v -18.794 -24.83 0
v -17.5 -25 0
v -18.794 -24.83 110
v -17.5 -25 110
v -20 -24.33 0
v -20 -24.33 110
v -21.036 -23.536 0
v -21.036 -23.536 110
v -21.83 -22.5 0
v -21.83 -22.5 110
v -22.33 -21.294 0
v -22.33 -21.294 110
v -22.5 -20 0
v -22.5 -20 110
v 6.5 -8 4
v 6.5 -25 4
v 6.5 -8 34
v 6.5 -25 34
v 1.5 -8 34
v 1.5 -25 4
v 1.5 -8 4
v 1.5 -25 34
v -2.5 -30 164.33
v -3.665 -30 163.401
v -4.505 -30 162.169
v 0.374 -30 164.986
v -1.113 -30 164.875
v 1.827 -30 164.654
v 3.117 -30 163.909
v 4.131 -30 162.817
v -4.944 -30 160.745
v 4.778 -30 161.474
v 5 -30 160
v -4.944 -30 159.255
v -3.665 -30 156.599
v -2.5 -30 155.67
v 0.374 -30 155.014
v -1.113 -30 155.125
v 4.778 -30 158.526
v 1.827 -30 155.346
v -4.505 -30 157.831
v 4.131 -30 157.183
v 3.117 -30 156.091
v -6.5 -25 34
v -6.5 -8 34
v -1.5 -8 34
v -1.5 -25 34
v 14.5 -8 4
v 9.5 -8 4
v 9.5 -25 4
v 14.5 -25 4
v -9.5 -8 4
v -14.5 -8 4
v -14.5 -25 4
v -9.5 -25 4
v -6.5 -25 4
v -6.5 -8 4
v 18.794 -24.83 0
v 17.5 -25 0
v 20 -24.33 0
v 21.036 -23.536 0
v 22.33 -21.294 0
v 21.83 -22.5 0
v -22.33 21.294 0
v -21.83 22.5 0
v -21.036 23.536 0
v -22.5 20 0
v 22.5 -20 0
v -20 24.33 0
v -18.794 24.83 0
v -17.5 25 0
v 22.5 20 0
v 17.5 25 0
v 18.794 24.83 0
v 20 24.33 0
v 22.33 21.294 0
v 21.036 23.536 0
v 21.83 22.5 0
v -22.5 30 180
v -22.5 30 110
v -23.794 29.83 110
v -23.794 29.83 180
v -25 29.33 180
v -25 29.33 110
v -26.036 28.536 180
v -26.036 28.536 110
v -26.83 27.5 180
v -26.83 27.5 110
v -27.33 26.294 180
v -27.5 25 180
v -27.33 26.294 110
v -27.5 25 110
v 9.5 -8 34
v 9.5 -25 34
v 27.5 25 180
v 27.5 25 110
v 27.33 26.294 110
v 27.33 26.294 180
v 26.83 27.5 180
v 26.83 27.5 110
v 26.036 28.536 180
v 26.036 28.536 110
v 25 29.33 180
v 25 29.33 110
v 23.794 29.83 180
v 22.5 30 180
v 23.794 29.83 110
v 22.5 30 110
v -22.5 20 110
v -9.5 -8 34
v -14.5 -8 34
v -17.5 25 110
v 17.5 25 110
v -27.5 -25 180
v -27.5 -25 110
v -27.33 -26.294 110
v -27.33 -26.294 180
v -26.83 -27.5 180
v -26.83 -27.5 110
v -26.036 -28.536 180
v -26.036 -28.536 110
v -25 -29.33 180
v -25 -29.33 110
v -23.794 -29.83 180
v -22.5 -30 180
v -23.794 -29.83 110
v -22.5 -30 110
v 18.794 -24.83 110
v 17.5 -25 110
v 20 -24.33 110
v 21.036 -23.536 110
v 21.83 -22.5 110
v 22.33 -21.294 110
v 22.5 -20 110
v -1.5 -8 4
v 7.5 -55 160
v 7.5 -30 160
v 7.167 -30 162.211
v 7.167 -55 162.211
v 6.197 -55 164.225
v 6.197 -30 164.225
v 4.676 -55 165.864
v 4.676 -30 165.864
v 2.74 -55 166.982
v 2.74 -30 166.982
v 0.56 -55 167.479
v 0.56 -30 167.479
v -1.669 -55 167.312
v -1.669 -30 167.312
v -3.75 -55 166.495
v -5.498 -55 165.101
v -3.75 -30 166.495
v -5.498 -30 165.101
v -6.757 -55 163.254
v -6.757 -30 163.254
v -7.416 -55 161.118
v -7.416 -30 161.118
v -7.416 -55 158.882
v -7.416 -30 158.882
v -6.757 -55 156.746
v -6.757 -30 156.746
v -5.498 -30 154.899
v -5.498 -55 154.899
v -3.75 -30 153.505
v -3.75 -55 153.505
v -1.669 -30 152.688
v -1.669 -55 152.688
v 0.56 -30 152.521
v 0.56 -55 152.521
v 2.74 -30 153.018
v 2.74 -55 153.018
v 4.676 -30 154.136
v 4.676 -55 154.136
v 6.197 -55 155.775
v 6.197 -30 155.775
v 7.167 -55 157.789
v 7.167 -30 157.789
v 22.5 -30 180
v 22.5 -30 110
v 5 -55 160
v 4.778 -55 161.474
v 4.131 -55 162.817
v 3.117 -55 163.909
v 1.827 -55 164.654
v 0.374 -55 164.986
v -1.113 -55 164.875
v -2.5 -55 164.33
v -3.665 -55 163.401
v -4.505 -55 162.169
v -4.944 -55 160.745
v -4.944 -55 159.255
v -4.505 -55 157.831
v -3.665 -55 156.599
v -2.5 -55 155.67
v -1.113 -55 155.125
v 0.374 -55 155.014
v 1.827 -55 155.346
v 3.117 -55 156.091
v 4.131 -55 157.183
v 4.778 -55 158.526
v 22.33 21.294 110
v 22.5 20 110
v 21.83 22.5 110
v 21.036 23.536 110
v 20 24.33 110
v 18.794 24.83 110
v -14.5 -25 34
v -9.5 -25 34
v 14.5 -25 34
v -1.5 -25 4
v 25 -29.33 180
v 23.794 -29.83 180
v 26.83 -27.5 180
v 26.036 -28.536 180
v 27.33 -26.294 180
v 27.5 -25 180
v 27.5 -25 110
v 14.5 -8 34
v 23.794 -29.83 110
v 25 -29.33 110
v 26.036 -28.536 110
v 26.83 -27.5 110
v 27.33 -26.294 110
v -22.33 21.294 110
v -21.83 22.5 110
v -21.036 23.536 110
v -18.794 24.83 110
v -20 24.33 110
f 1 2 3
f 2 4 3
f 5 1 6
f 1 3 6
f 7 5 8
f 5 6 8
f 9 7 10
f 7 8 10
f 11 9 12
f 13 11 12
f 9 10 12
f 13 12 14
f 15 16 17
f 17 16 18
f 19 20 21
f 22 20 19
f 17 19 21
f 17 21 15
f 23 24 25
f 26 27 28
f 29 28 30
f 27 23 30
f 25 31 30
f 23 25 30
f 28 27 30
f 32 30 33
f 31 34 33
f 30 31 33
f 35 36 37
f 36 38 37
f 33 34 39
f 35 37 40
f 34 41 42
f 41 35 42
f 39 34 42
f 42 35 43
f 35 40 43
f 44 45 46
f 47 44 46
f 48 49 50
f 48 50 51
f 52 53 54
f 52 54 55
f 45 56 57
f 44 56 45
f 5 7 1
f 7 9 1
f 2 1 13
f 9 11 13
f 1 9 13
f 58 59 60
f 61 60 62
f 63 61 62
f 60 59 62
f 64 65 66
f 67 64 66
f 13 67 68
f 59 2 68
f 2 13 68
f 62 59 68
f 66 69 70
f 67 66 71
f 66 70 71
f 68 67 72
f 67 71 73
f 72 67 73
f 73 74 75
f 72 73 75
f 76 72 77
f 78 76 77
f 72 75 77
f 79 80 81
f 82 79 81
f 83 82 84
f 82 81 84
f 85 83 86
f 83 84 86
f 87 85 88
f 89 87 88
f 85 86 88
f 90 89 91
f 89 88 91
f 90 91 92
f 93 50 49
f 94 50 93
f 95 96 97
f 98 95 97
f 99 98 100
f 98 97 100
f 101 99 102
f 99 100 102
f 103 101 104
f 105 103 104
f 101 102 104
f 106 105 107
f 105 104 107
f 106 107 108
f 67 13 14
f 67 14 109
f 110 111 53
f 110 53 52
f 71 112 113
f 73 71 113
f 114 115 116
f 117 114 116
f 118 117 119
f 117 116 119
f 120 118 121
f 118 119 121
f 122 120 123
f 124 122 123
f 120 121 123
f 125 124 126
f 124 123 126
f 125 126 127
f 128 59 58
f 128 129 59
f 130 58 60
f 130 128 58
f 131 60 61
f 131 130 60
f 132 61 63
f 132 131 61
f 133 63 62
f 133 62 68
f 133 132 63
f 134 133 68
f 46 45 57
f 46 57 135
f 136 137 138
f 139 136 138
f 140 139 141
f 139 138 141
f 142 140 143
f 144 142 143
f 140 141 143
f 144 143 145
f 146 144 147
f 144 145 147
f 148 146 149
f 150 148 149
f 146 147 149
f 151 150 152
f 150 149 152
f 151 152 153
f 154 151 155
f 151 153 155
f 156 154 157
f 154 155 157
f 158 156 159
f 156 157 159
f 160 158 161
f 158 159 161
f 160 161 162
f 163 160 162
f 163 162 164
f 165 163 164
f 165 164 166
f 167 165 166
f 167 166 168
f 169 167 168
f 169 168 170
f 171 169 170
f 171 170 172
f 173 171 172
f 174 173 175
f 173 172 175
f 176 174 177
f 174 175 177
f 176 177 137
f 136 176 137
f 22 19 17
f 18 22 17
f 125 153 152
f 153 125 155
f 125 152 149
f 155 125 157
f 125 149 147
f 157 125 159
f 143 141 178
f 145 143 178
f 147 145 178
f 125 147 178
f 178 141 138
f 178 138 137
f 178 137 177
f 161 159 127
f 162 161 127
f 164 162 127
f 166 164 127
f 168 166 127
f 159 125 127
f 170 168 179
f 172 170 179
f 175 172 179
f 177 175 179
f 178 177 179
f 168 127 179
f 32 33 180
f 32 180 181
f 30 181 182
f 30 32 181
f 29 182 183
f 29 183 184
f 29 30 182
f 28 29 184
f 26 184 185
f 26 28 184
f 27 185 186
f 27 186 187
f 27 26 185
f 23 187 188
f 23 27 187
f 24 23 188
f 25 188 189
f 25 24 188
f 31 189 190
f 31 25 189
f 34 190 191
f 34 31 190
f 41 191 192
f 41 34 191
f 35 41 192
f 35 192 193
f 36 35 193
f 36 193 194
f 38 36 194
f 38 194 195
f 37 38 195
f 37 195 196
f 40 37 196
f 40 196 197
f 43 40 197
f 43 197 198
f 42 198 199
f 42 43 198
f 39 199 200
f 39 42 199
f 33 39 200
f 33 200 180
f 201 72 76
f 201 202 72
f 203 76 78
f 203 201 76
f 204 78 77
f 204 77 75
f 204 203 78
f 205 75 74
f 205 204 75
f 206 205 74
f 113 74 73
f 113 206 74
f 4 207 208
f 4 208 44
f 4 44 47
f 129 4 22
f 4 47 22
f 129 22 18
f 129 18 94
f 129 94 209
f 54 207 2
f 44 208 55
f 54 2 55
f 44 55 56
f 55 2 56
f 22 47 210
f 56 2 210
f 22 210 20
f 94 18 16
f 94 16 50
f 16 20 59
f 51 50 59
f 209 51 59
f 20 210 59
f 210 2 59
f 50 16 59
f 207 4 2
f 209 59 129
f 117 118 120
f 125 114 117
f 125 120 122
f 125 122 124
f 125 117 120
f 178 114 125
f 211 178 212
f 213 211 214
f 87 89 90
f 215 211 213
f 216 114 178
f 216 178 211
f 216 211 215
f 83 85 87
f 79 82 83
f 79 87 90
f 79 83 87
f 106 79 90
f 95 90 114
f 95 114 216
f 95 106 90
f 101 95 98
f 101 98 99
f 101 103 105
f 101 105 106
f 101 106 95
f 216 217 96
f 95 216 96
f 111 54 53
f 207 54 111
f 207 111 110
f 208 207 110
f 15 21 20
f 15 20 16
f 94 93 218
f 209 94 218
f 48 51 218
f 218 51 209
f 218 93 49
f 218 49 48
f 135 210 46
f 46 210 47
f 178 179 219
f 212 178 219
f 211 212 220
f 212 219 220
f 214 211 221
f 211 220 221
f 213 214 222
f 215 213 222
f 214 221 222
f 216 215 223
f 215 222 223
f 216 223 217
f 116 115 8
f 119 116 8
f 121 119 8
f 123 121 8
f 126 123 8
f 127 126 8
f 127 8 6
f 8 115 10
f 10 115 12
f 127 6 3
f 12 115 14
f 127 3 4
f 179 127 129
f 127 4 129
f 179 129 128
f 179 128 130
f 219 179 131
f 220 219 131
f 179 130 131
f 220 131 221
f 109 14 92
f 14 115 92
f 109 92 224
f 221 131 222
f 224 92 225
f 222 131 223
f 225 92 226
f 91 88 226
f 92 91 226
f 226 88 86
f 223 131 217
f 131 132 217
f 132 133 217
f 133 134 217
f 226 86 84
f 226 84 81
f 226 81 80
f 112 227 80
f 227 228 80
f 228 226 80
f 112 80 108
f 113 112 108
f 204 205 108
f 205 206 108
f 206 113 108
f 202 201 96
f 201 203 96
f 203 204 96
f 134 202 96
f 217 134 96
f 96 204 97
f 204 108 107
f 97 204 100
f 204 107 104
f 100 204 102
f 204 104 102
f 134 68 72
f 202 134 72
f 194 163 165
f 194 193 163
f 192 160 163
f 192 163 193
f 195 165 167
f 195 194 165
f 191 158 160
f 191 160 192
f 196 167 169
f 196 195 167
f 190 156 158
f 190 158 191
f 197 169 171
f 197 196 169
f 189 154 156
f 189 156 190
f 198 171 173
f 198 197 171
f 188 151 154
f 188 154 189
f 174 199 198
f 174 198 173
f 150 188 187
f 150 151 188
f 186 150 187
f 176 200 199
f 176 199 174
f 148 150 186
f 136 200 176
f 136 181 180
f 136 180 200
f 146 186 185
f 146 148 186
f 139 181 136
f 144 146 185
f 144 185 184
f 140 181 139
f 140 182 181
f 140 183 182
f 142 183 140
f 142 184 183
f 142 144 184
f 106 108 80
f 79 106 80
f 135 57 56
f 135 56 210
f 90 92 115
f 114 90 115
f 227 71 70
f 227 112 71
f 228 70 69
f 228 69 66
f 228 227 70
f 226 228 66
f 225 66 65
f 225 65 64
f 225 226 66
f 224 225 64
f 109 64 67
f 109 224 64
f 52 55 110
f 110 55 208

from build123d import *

# Parameters (mm, degrees)
F0_W     = 45
F0_H     = 50
F1_DEPTH = 110
F2_W     = 45
F2_H     = 50
F3_DEPTH = 70
F4_R     = 5
F5_W     = 5
F5_H     = 30
F6_DEPTH = 17
F7_R     = 7.5
F7_R_2   = 5
F8_DEPTH = 25


with BuildPart() as f1:
    # F0 (on Top) → F1 (new body)
    with BuildSketch(Plane.XY):
        Rectangle(F0_W, F0_H)
    extrude(amount=F1_DEPTH)

    # F2 (on face) → F3 (join)
    with BuildSketch(Plane.XY.offset(110)):
        with BuildLine():
            ThreePointArc((-27.5, -25), (-26.0355339059, -28.5355339059), (-22.5, -30))
            Line((-22.5, -30), (22.5, -30))
            ThreePointArc((22.5, -30), (26.0355339059, -28.5355339059), (27.5, -25))
            Line((27.5, -25), (27.5, 25))
            ThreePointArc((27.5, 25), (26.0355339059, 28.5355339059), (22.5, 30))
            Line((22.5, 30), (-22.5, 30))
            ThreePointArc((-22.5, 30), (-26.0355339059, 28.5355339059), (-27.5, 25))
            Line((-27.5, 25), (-27.5, -25))
        make_face()
        Rectangle(F2_W, F2_H, mode=Mode.SUBTRACT)
        Rectangle(F2_W, F2_H)
    extrude(amount=F3_DEPTH)

    # F4
    f4_edges = [f1.edges().sort_by_distance(p)[0] for p in [
        (22.5, 25, 55),
        (22.5, -25, 55),
        (-22.5, -25, 55),
        (-22.5, 25, 55),
    ]]
    fillet(f4_edges, radius=F4_R)

    # F5 (on face) → F6 (cut)
    with BuildSketch(Plane.XZ.offset(25)):
        with Locations((-12, 19)):
            Rectangle(F5_W, F5_H)
        with Locations((-4, 19)):
            Rectangle(F5_W, F5_H)
        with Locations((4, 19)):
            Rectangle(F5_W, F5_H)
        with Locations((12, 19)):
            Rectangle(F5_W, F5_H)
    extrude(amount=-F6_DEPTH, mode=Mode.SUBTRACT)

    # F7 (on face) → F8 (join)
    with BuildSketch(Plane.XZ.offset(30)):
        with Locations((0, 160)):
            Circle(F7_R)
        with Locations((0, 160)):
            Circle(F7_R_2, mode=Mode.SUBTRACT)
    extrude(amount=F8_DEPTH)


solid = f1.part
